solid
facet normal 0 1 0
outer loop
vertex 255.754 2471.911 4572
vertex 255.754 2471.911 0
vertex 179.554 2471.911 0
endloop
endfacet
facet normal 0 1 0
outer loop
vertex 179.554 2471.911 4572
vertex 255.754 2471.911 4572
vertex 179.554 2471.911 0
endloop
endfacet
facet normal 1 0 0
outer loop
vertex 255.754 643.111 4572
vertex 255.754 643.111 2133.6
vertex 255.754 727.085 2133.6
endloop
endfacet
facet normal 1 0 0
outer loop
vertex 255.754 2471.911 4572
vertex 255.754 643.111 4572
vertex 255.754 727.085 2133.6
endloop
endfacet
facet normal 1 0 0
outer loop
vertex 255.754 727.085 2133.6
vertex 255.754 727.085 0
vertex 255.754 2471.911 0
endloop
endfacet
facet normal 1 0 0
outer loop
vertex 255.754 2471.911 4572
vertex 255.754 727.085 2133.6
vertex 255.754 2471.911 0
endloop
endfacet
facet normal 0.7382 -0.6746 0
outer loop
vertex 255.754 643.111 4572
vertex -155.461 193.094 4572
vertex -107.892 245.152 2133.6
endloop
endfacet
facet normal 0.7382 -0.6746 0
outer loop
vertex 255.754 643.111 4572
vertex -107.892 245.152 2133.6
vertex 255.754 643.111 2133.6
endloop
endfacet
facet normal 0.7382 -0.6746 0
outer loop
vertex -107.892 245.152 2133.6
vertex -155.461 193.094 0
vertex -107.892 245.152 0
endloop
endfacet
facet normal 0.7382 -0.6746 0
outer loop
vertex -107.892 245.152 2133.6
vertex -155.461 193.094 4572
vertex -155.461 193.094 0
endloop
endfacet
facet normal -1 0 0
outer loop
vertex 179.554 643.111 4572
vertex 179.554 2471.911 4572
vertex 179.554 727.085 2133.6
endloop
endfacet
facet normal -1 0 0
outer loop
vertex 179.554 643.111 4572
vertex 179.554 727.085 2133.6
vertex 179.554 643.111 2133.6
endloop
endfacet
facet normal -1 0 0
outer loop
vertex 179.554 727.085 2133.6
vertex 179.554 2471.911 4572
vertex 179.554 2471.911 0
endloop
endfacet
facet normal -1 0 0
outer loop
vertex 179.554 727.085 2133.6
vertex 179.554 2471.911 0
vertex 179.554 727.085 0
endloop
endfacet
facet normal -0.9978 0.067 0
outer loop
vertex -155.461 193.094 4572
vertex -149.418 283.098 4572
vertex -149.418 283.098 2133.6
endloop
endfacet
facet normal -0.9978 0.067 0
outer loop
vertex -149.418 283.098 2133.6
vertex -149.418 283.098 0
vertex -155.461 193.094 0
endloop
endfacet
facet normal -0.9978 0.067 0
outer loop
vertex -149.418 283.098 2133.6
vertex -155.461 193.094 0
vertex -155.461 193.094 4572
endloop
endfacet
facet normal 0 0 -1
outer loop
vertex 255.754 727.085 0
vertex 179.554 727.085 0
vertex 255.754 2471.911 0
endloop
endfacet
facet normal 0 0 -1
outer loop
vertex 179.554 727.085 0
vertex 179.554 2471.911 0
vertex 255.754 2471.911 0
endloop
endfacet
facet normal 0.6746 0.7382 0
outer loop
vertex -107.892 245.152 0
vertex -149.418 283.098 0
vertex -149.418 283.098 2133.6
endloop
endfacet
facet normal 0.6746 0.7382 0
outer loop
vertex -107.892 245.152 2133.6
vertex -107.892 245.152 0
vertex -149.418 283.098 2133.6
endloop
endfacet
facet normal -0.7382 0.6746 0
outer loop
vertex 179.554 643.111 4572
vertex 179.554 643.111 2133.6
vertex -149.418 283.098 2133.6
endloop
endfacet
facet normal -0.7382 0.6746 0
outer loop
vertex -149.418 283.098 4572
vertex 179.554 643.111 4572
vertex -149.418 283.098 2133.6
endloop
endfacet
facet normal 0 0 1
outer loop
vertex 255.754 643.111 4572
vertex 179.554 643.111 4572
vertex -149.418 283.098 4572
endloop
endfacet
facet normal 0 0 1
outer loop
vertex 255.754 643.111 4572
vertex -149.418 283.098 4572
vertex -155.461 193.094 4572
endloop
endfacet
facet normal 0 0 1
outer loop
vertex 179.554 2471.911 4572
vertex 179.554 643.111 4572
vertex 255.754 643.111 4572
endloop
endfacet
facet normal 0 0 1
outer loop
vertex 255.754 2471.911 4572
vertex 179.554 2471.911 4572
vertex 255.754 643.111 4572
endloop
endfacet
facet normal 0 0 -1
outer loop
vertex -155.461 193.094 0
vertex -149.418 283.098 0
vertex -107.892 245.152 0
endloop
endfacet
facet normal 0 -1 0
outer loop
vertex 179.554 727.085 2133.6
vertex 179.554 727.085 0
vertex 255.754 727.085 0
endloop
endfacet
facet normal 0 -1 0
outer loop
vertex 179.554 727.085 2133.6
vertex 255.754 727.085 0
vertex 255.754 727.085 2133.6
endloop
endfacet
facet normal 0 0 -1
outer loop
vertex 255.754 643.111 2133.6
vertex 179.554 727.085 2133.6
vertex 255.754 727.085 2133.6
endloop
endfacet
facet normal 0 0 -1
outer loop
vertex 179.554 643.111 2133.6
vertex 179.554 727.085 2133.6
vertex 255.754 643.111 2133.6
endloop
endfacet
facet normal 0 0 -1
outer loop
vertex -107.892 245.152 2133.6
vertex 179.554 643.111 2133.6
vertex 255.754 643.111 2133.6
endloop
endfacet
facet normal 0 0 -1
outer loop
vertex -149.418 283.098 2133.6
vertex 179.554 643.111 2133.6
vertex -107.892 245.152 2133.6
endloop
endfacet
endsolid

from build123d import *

# Parameters (mm, degrees)
F1_DEPTH = 4572
F2_W     = 487.68
F2_H     = 2133.6
F3_DEPTH = 76.2
F4_W     = 121.92
F4_H     = 2133.6
F5_DEPTH = 76.2


with BuildPart() as f1:
    # F0 (on Top) → F1 (new body)
    with BuildSketch(Plane.XY):
        Polygon((255.7539751807, 643.1105594851), (255.7539751807, 2471.9105594851), (179.5539751807, 2471.9105594851), (179.5539751807, 643.1105594851), (-149.4179206286, 283.0976789272), (-155.460894581, 193.0944587877), align=None)
    extrude(amount=F1_DEPTH)

    # F2 (on face) → F3 (cut)
    with BuildSketch(Plane(origin=(-222.4024566315, 203.2265003333, 0), x_dir=(-0.6745650751, -0.7382153883, 0), z_dir=(-0.7382153883, 0.6745650751, 0))):
        with Locations((-352.0349521259, 1066.8)):
            Rectangle(F2_W, F2_H)
    extrude(amount=-F3_DEPTH, mode=Mode.SUBTRACT)

    # F4 (on face) → F5 (cut)
    with BuildSketch(Plane(origin=(179.5539751807, 0, 0), x_dir=(0, -1, 0), z_dir=(-1, 0, 0))):
        with Locations((-666.1249163915, 1066.8)):
            Rectangle(F4_W, F4_H)
    extrude(amount=-F5_DEPTH, mode=Mode.SUBTRACT)


solid = f1.part
